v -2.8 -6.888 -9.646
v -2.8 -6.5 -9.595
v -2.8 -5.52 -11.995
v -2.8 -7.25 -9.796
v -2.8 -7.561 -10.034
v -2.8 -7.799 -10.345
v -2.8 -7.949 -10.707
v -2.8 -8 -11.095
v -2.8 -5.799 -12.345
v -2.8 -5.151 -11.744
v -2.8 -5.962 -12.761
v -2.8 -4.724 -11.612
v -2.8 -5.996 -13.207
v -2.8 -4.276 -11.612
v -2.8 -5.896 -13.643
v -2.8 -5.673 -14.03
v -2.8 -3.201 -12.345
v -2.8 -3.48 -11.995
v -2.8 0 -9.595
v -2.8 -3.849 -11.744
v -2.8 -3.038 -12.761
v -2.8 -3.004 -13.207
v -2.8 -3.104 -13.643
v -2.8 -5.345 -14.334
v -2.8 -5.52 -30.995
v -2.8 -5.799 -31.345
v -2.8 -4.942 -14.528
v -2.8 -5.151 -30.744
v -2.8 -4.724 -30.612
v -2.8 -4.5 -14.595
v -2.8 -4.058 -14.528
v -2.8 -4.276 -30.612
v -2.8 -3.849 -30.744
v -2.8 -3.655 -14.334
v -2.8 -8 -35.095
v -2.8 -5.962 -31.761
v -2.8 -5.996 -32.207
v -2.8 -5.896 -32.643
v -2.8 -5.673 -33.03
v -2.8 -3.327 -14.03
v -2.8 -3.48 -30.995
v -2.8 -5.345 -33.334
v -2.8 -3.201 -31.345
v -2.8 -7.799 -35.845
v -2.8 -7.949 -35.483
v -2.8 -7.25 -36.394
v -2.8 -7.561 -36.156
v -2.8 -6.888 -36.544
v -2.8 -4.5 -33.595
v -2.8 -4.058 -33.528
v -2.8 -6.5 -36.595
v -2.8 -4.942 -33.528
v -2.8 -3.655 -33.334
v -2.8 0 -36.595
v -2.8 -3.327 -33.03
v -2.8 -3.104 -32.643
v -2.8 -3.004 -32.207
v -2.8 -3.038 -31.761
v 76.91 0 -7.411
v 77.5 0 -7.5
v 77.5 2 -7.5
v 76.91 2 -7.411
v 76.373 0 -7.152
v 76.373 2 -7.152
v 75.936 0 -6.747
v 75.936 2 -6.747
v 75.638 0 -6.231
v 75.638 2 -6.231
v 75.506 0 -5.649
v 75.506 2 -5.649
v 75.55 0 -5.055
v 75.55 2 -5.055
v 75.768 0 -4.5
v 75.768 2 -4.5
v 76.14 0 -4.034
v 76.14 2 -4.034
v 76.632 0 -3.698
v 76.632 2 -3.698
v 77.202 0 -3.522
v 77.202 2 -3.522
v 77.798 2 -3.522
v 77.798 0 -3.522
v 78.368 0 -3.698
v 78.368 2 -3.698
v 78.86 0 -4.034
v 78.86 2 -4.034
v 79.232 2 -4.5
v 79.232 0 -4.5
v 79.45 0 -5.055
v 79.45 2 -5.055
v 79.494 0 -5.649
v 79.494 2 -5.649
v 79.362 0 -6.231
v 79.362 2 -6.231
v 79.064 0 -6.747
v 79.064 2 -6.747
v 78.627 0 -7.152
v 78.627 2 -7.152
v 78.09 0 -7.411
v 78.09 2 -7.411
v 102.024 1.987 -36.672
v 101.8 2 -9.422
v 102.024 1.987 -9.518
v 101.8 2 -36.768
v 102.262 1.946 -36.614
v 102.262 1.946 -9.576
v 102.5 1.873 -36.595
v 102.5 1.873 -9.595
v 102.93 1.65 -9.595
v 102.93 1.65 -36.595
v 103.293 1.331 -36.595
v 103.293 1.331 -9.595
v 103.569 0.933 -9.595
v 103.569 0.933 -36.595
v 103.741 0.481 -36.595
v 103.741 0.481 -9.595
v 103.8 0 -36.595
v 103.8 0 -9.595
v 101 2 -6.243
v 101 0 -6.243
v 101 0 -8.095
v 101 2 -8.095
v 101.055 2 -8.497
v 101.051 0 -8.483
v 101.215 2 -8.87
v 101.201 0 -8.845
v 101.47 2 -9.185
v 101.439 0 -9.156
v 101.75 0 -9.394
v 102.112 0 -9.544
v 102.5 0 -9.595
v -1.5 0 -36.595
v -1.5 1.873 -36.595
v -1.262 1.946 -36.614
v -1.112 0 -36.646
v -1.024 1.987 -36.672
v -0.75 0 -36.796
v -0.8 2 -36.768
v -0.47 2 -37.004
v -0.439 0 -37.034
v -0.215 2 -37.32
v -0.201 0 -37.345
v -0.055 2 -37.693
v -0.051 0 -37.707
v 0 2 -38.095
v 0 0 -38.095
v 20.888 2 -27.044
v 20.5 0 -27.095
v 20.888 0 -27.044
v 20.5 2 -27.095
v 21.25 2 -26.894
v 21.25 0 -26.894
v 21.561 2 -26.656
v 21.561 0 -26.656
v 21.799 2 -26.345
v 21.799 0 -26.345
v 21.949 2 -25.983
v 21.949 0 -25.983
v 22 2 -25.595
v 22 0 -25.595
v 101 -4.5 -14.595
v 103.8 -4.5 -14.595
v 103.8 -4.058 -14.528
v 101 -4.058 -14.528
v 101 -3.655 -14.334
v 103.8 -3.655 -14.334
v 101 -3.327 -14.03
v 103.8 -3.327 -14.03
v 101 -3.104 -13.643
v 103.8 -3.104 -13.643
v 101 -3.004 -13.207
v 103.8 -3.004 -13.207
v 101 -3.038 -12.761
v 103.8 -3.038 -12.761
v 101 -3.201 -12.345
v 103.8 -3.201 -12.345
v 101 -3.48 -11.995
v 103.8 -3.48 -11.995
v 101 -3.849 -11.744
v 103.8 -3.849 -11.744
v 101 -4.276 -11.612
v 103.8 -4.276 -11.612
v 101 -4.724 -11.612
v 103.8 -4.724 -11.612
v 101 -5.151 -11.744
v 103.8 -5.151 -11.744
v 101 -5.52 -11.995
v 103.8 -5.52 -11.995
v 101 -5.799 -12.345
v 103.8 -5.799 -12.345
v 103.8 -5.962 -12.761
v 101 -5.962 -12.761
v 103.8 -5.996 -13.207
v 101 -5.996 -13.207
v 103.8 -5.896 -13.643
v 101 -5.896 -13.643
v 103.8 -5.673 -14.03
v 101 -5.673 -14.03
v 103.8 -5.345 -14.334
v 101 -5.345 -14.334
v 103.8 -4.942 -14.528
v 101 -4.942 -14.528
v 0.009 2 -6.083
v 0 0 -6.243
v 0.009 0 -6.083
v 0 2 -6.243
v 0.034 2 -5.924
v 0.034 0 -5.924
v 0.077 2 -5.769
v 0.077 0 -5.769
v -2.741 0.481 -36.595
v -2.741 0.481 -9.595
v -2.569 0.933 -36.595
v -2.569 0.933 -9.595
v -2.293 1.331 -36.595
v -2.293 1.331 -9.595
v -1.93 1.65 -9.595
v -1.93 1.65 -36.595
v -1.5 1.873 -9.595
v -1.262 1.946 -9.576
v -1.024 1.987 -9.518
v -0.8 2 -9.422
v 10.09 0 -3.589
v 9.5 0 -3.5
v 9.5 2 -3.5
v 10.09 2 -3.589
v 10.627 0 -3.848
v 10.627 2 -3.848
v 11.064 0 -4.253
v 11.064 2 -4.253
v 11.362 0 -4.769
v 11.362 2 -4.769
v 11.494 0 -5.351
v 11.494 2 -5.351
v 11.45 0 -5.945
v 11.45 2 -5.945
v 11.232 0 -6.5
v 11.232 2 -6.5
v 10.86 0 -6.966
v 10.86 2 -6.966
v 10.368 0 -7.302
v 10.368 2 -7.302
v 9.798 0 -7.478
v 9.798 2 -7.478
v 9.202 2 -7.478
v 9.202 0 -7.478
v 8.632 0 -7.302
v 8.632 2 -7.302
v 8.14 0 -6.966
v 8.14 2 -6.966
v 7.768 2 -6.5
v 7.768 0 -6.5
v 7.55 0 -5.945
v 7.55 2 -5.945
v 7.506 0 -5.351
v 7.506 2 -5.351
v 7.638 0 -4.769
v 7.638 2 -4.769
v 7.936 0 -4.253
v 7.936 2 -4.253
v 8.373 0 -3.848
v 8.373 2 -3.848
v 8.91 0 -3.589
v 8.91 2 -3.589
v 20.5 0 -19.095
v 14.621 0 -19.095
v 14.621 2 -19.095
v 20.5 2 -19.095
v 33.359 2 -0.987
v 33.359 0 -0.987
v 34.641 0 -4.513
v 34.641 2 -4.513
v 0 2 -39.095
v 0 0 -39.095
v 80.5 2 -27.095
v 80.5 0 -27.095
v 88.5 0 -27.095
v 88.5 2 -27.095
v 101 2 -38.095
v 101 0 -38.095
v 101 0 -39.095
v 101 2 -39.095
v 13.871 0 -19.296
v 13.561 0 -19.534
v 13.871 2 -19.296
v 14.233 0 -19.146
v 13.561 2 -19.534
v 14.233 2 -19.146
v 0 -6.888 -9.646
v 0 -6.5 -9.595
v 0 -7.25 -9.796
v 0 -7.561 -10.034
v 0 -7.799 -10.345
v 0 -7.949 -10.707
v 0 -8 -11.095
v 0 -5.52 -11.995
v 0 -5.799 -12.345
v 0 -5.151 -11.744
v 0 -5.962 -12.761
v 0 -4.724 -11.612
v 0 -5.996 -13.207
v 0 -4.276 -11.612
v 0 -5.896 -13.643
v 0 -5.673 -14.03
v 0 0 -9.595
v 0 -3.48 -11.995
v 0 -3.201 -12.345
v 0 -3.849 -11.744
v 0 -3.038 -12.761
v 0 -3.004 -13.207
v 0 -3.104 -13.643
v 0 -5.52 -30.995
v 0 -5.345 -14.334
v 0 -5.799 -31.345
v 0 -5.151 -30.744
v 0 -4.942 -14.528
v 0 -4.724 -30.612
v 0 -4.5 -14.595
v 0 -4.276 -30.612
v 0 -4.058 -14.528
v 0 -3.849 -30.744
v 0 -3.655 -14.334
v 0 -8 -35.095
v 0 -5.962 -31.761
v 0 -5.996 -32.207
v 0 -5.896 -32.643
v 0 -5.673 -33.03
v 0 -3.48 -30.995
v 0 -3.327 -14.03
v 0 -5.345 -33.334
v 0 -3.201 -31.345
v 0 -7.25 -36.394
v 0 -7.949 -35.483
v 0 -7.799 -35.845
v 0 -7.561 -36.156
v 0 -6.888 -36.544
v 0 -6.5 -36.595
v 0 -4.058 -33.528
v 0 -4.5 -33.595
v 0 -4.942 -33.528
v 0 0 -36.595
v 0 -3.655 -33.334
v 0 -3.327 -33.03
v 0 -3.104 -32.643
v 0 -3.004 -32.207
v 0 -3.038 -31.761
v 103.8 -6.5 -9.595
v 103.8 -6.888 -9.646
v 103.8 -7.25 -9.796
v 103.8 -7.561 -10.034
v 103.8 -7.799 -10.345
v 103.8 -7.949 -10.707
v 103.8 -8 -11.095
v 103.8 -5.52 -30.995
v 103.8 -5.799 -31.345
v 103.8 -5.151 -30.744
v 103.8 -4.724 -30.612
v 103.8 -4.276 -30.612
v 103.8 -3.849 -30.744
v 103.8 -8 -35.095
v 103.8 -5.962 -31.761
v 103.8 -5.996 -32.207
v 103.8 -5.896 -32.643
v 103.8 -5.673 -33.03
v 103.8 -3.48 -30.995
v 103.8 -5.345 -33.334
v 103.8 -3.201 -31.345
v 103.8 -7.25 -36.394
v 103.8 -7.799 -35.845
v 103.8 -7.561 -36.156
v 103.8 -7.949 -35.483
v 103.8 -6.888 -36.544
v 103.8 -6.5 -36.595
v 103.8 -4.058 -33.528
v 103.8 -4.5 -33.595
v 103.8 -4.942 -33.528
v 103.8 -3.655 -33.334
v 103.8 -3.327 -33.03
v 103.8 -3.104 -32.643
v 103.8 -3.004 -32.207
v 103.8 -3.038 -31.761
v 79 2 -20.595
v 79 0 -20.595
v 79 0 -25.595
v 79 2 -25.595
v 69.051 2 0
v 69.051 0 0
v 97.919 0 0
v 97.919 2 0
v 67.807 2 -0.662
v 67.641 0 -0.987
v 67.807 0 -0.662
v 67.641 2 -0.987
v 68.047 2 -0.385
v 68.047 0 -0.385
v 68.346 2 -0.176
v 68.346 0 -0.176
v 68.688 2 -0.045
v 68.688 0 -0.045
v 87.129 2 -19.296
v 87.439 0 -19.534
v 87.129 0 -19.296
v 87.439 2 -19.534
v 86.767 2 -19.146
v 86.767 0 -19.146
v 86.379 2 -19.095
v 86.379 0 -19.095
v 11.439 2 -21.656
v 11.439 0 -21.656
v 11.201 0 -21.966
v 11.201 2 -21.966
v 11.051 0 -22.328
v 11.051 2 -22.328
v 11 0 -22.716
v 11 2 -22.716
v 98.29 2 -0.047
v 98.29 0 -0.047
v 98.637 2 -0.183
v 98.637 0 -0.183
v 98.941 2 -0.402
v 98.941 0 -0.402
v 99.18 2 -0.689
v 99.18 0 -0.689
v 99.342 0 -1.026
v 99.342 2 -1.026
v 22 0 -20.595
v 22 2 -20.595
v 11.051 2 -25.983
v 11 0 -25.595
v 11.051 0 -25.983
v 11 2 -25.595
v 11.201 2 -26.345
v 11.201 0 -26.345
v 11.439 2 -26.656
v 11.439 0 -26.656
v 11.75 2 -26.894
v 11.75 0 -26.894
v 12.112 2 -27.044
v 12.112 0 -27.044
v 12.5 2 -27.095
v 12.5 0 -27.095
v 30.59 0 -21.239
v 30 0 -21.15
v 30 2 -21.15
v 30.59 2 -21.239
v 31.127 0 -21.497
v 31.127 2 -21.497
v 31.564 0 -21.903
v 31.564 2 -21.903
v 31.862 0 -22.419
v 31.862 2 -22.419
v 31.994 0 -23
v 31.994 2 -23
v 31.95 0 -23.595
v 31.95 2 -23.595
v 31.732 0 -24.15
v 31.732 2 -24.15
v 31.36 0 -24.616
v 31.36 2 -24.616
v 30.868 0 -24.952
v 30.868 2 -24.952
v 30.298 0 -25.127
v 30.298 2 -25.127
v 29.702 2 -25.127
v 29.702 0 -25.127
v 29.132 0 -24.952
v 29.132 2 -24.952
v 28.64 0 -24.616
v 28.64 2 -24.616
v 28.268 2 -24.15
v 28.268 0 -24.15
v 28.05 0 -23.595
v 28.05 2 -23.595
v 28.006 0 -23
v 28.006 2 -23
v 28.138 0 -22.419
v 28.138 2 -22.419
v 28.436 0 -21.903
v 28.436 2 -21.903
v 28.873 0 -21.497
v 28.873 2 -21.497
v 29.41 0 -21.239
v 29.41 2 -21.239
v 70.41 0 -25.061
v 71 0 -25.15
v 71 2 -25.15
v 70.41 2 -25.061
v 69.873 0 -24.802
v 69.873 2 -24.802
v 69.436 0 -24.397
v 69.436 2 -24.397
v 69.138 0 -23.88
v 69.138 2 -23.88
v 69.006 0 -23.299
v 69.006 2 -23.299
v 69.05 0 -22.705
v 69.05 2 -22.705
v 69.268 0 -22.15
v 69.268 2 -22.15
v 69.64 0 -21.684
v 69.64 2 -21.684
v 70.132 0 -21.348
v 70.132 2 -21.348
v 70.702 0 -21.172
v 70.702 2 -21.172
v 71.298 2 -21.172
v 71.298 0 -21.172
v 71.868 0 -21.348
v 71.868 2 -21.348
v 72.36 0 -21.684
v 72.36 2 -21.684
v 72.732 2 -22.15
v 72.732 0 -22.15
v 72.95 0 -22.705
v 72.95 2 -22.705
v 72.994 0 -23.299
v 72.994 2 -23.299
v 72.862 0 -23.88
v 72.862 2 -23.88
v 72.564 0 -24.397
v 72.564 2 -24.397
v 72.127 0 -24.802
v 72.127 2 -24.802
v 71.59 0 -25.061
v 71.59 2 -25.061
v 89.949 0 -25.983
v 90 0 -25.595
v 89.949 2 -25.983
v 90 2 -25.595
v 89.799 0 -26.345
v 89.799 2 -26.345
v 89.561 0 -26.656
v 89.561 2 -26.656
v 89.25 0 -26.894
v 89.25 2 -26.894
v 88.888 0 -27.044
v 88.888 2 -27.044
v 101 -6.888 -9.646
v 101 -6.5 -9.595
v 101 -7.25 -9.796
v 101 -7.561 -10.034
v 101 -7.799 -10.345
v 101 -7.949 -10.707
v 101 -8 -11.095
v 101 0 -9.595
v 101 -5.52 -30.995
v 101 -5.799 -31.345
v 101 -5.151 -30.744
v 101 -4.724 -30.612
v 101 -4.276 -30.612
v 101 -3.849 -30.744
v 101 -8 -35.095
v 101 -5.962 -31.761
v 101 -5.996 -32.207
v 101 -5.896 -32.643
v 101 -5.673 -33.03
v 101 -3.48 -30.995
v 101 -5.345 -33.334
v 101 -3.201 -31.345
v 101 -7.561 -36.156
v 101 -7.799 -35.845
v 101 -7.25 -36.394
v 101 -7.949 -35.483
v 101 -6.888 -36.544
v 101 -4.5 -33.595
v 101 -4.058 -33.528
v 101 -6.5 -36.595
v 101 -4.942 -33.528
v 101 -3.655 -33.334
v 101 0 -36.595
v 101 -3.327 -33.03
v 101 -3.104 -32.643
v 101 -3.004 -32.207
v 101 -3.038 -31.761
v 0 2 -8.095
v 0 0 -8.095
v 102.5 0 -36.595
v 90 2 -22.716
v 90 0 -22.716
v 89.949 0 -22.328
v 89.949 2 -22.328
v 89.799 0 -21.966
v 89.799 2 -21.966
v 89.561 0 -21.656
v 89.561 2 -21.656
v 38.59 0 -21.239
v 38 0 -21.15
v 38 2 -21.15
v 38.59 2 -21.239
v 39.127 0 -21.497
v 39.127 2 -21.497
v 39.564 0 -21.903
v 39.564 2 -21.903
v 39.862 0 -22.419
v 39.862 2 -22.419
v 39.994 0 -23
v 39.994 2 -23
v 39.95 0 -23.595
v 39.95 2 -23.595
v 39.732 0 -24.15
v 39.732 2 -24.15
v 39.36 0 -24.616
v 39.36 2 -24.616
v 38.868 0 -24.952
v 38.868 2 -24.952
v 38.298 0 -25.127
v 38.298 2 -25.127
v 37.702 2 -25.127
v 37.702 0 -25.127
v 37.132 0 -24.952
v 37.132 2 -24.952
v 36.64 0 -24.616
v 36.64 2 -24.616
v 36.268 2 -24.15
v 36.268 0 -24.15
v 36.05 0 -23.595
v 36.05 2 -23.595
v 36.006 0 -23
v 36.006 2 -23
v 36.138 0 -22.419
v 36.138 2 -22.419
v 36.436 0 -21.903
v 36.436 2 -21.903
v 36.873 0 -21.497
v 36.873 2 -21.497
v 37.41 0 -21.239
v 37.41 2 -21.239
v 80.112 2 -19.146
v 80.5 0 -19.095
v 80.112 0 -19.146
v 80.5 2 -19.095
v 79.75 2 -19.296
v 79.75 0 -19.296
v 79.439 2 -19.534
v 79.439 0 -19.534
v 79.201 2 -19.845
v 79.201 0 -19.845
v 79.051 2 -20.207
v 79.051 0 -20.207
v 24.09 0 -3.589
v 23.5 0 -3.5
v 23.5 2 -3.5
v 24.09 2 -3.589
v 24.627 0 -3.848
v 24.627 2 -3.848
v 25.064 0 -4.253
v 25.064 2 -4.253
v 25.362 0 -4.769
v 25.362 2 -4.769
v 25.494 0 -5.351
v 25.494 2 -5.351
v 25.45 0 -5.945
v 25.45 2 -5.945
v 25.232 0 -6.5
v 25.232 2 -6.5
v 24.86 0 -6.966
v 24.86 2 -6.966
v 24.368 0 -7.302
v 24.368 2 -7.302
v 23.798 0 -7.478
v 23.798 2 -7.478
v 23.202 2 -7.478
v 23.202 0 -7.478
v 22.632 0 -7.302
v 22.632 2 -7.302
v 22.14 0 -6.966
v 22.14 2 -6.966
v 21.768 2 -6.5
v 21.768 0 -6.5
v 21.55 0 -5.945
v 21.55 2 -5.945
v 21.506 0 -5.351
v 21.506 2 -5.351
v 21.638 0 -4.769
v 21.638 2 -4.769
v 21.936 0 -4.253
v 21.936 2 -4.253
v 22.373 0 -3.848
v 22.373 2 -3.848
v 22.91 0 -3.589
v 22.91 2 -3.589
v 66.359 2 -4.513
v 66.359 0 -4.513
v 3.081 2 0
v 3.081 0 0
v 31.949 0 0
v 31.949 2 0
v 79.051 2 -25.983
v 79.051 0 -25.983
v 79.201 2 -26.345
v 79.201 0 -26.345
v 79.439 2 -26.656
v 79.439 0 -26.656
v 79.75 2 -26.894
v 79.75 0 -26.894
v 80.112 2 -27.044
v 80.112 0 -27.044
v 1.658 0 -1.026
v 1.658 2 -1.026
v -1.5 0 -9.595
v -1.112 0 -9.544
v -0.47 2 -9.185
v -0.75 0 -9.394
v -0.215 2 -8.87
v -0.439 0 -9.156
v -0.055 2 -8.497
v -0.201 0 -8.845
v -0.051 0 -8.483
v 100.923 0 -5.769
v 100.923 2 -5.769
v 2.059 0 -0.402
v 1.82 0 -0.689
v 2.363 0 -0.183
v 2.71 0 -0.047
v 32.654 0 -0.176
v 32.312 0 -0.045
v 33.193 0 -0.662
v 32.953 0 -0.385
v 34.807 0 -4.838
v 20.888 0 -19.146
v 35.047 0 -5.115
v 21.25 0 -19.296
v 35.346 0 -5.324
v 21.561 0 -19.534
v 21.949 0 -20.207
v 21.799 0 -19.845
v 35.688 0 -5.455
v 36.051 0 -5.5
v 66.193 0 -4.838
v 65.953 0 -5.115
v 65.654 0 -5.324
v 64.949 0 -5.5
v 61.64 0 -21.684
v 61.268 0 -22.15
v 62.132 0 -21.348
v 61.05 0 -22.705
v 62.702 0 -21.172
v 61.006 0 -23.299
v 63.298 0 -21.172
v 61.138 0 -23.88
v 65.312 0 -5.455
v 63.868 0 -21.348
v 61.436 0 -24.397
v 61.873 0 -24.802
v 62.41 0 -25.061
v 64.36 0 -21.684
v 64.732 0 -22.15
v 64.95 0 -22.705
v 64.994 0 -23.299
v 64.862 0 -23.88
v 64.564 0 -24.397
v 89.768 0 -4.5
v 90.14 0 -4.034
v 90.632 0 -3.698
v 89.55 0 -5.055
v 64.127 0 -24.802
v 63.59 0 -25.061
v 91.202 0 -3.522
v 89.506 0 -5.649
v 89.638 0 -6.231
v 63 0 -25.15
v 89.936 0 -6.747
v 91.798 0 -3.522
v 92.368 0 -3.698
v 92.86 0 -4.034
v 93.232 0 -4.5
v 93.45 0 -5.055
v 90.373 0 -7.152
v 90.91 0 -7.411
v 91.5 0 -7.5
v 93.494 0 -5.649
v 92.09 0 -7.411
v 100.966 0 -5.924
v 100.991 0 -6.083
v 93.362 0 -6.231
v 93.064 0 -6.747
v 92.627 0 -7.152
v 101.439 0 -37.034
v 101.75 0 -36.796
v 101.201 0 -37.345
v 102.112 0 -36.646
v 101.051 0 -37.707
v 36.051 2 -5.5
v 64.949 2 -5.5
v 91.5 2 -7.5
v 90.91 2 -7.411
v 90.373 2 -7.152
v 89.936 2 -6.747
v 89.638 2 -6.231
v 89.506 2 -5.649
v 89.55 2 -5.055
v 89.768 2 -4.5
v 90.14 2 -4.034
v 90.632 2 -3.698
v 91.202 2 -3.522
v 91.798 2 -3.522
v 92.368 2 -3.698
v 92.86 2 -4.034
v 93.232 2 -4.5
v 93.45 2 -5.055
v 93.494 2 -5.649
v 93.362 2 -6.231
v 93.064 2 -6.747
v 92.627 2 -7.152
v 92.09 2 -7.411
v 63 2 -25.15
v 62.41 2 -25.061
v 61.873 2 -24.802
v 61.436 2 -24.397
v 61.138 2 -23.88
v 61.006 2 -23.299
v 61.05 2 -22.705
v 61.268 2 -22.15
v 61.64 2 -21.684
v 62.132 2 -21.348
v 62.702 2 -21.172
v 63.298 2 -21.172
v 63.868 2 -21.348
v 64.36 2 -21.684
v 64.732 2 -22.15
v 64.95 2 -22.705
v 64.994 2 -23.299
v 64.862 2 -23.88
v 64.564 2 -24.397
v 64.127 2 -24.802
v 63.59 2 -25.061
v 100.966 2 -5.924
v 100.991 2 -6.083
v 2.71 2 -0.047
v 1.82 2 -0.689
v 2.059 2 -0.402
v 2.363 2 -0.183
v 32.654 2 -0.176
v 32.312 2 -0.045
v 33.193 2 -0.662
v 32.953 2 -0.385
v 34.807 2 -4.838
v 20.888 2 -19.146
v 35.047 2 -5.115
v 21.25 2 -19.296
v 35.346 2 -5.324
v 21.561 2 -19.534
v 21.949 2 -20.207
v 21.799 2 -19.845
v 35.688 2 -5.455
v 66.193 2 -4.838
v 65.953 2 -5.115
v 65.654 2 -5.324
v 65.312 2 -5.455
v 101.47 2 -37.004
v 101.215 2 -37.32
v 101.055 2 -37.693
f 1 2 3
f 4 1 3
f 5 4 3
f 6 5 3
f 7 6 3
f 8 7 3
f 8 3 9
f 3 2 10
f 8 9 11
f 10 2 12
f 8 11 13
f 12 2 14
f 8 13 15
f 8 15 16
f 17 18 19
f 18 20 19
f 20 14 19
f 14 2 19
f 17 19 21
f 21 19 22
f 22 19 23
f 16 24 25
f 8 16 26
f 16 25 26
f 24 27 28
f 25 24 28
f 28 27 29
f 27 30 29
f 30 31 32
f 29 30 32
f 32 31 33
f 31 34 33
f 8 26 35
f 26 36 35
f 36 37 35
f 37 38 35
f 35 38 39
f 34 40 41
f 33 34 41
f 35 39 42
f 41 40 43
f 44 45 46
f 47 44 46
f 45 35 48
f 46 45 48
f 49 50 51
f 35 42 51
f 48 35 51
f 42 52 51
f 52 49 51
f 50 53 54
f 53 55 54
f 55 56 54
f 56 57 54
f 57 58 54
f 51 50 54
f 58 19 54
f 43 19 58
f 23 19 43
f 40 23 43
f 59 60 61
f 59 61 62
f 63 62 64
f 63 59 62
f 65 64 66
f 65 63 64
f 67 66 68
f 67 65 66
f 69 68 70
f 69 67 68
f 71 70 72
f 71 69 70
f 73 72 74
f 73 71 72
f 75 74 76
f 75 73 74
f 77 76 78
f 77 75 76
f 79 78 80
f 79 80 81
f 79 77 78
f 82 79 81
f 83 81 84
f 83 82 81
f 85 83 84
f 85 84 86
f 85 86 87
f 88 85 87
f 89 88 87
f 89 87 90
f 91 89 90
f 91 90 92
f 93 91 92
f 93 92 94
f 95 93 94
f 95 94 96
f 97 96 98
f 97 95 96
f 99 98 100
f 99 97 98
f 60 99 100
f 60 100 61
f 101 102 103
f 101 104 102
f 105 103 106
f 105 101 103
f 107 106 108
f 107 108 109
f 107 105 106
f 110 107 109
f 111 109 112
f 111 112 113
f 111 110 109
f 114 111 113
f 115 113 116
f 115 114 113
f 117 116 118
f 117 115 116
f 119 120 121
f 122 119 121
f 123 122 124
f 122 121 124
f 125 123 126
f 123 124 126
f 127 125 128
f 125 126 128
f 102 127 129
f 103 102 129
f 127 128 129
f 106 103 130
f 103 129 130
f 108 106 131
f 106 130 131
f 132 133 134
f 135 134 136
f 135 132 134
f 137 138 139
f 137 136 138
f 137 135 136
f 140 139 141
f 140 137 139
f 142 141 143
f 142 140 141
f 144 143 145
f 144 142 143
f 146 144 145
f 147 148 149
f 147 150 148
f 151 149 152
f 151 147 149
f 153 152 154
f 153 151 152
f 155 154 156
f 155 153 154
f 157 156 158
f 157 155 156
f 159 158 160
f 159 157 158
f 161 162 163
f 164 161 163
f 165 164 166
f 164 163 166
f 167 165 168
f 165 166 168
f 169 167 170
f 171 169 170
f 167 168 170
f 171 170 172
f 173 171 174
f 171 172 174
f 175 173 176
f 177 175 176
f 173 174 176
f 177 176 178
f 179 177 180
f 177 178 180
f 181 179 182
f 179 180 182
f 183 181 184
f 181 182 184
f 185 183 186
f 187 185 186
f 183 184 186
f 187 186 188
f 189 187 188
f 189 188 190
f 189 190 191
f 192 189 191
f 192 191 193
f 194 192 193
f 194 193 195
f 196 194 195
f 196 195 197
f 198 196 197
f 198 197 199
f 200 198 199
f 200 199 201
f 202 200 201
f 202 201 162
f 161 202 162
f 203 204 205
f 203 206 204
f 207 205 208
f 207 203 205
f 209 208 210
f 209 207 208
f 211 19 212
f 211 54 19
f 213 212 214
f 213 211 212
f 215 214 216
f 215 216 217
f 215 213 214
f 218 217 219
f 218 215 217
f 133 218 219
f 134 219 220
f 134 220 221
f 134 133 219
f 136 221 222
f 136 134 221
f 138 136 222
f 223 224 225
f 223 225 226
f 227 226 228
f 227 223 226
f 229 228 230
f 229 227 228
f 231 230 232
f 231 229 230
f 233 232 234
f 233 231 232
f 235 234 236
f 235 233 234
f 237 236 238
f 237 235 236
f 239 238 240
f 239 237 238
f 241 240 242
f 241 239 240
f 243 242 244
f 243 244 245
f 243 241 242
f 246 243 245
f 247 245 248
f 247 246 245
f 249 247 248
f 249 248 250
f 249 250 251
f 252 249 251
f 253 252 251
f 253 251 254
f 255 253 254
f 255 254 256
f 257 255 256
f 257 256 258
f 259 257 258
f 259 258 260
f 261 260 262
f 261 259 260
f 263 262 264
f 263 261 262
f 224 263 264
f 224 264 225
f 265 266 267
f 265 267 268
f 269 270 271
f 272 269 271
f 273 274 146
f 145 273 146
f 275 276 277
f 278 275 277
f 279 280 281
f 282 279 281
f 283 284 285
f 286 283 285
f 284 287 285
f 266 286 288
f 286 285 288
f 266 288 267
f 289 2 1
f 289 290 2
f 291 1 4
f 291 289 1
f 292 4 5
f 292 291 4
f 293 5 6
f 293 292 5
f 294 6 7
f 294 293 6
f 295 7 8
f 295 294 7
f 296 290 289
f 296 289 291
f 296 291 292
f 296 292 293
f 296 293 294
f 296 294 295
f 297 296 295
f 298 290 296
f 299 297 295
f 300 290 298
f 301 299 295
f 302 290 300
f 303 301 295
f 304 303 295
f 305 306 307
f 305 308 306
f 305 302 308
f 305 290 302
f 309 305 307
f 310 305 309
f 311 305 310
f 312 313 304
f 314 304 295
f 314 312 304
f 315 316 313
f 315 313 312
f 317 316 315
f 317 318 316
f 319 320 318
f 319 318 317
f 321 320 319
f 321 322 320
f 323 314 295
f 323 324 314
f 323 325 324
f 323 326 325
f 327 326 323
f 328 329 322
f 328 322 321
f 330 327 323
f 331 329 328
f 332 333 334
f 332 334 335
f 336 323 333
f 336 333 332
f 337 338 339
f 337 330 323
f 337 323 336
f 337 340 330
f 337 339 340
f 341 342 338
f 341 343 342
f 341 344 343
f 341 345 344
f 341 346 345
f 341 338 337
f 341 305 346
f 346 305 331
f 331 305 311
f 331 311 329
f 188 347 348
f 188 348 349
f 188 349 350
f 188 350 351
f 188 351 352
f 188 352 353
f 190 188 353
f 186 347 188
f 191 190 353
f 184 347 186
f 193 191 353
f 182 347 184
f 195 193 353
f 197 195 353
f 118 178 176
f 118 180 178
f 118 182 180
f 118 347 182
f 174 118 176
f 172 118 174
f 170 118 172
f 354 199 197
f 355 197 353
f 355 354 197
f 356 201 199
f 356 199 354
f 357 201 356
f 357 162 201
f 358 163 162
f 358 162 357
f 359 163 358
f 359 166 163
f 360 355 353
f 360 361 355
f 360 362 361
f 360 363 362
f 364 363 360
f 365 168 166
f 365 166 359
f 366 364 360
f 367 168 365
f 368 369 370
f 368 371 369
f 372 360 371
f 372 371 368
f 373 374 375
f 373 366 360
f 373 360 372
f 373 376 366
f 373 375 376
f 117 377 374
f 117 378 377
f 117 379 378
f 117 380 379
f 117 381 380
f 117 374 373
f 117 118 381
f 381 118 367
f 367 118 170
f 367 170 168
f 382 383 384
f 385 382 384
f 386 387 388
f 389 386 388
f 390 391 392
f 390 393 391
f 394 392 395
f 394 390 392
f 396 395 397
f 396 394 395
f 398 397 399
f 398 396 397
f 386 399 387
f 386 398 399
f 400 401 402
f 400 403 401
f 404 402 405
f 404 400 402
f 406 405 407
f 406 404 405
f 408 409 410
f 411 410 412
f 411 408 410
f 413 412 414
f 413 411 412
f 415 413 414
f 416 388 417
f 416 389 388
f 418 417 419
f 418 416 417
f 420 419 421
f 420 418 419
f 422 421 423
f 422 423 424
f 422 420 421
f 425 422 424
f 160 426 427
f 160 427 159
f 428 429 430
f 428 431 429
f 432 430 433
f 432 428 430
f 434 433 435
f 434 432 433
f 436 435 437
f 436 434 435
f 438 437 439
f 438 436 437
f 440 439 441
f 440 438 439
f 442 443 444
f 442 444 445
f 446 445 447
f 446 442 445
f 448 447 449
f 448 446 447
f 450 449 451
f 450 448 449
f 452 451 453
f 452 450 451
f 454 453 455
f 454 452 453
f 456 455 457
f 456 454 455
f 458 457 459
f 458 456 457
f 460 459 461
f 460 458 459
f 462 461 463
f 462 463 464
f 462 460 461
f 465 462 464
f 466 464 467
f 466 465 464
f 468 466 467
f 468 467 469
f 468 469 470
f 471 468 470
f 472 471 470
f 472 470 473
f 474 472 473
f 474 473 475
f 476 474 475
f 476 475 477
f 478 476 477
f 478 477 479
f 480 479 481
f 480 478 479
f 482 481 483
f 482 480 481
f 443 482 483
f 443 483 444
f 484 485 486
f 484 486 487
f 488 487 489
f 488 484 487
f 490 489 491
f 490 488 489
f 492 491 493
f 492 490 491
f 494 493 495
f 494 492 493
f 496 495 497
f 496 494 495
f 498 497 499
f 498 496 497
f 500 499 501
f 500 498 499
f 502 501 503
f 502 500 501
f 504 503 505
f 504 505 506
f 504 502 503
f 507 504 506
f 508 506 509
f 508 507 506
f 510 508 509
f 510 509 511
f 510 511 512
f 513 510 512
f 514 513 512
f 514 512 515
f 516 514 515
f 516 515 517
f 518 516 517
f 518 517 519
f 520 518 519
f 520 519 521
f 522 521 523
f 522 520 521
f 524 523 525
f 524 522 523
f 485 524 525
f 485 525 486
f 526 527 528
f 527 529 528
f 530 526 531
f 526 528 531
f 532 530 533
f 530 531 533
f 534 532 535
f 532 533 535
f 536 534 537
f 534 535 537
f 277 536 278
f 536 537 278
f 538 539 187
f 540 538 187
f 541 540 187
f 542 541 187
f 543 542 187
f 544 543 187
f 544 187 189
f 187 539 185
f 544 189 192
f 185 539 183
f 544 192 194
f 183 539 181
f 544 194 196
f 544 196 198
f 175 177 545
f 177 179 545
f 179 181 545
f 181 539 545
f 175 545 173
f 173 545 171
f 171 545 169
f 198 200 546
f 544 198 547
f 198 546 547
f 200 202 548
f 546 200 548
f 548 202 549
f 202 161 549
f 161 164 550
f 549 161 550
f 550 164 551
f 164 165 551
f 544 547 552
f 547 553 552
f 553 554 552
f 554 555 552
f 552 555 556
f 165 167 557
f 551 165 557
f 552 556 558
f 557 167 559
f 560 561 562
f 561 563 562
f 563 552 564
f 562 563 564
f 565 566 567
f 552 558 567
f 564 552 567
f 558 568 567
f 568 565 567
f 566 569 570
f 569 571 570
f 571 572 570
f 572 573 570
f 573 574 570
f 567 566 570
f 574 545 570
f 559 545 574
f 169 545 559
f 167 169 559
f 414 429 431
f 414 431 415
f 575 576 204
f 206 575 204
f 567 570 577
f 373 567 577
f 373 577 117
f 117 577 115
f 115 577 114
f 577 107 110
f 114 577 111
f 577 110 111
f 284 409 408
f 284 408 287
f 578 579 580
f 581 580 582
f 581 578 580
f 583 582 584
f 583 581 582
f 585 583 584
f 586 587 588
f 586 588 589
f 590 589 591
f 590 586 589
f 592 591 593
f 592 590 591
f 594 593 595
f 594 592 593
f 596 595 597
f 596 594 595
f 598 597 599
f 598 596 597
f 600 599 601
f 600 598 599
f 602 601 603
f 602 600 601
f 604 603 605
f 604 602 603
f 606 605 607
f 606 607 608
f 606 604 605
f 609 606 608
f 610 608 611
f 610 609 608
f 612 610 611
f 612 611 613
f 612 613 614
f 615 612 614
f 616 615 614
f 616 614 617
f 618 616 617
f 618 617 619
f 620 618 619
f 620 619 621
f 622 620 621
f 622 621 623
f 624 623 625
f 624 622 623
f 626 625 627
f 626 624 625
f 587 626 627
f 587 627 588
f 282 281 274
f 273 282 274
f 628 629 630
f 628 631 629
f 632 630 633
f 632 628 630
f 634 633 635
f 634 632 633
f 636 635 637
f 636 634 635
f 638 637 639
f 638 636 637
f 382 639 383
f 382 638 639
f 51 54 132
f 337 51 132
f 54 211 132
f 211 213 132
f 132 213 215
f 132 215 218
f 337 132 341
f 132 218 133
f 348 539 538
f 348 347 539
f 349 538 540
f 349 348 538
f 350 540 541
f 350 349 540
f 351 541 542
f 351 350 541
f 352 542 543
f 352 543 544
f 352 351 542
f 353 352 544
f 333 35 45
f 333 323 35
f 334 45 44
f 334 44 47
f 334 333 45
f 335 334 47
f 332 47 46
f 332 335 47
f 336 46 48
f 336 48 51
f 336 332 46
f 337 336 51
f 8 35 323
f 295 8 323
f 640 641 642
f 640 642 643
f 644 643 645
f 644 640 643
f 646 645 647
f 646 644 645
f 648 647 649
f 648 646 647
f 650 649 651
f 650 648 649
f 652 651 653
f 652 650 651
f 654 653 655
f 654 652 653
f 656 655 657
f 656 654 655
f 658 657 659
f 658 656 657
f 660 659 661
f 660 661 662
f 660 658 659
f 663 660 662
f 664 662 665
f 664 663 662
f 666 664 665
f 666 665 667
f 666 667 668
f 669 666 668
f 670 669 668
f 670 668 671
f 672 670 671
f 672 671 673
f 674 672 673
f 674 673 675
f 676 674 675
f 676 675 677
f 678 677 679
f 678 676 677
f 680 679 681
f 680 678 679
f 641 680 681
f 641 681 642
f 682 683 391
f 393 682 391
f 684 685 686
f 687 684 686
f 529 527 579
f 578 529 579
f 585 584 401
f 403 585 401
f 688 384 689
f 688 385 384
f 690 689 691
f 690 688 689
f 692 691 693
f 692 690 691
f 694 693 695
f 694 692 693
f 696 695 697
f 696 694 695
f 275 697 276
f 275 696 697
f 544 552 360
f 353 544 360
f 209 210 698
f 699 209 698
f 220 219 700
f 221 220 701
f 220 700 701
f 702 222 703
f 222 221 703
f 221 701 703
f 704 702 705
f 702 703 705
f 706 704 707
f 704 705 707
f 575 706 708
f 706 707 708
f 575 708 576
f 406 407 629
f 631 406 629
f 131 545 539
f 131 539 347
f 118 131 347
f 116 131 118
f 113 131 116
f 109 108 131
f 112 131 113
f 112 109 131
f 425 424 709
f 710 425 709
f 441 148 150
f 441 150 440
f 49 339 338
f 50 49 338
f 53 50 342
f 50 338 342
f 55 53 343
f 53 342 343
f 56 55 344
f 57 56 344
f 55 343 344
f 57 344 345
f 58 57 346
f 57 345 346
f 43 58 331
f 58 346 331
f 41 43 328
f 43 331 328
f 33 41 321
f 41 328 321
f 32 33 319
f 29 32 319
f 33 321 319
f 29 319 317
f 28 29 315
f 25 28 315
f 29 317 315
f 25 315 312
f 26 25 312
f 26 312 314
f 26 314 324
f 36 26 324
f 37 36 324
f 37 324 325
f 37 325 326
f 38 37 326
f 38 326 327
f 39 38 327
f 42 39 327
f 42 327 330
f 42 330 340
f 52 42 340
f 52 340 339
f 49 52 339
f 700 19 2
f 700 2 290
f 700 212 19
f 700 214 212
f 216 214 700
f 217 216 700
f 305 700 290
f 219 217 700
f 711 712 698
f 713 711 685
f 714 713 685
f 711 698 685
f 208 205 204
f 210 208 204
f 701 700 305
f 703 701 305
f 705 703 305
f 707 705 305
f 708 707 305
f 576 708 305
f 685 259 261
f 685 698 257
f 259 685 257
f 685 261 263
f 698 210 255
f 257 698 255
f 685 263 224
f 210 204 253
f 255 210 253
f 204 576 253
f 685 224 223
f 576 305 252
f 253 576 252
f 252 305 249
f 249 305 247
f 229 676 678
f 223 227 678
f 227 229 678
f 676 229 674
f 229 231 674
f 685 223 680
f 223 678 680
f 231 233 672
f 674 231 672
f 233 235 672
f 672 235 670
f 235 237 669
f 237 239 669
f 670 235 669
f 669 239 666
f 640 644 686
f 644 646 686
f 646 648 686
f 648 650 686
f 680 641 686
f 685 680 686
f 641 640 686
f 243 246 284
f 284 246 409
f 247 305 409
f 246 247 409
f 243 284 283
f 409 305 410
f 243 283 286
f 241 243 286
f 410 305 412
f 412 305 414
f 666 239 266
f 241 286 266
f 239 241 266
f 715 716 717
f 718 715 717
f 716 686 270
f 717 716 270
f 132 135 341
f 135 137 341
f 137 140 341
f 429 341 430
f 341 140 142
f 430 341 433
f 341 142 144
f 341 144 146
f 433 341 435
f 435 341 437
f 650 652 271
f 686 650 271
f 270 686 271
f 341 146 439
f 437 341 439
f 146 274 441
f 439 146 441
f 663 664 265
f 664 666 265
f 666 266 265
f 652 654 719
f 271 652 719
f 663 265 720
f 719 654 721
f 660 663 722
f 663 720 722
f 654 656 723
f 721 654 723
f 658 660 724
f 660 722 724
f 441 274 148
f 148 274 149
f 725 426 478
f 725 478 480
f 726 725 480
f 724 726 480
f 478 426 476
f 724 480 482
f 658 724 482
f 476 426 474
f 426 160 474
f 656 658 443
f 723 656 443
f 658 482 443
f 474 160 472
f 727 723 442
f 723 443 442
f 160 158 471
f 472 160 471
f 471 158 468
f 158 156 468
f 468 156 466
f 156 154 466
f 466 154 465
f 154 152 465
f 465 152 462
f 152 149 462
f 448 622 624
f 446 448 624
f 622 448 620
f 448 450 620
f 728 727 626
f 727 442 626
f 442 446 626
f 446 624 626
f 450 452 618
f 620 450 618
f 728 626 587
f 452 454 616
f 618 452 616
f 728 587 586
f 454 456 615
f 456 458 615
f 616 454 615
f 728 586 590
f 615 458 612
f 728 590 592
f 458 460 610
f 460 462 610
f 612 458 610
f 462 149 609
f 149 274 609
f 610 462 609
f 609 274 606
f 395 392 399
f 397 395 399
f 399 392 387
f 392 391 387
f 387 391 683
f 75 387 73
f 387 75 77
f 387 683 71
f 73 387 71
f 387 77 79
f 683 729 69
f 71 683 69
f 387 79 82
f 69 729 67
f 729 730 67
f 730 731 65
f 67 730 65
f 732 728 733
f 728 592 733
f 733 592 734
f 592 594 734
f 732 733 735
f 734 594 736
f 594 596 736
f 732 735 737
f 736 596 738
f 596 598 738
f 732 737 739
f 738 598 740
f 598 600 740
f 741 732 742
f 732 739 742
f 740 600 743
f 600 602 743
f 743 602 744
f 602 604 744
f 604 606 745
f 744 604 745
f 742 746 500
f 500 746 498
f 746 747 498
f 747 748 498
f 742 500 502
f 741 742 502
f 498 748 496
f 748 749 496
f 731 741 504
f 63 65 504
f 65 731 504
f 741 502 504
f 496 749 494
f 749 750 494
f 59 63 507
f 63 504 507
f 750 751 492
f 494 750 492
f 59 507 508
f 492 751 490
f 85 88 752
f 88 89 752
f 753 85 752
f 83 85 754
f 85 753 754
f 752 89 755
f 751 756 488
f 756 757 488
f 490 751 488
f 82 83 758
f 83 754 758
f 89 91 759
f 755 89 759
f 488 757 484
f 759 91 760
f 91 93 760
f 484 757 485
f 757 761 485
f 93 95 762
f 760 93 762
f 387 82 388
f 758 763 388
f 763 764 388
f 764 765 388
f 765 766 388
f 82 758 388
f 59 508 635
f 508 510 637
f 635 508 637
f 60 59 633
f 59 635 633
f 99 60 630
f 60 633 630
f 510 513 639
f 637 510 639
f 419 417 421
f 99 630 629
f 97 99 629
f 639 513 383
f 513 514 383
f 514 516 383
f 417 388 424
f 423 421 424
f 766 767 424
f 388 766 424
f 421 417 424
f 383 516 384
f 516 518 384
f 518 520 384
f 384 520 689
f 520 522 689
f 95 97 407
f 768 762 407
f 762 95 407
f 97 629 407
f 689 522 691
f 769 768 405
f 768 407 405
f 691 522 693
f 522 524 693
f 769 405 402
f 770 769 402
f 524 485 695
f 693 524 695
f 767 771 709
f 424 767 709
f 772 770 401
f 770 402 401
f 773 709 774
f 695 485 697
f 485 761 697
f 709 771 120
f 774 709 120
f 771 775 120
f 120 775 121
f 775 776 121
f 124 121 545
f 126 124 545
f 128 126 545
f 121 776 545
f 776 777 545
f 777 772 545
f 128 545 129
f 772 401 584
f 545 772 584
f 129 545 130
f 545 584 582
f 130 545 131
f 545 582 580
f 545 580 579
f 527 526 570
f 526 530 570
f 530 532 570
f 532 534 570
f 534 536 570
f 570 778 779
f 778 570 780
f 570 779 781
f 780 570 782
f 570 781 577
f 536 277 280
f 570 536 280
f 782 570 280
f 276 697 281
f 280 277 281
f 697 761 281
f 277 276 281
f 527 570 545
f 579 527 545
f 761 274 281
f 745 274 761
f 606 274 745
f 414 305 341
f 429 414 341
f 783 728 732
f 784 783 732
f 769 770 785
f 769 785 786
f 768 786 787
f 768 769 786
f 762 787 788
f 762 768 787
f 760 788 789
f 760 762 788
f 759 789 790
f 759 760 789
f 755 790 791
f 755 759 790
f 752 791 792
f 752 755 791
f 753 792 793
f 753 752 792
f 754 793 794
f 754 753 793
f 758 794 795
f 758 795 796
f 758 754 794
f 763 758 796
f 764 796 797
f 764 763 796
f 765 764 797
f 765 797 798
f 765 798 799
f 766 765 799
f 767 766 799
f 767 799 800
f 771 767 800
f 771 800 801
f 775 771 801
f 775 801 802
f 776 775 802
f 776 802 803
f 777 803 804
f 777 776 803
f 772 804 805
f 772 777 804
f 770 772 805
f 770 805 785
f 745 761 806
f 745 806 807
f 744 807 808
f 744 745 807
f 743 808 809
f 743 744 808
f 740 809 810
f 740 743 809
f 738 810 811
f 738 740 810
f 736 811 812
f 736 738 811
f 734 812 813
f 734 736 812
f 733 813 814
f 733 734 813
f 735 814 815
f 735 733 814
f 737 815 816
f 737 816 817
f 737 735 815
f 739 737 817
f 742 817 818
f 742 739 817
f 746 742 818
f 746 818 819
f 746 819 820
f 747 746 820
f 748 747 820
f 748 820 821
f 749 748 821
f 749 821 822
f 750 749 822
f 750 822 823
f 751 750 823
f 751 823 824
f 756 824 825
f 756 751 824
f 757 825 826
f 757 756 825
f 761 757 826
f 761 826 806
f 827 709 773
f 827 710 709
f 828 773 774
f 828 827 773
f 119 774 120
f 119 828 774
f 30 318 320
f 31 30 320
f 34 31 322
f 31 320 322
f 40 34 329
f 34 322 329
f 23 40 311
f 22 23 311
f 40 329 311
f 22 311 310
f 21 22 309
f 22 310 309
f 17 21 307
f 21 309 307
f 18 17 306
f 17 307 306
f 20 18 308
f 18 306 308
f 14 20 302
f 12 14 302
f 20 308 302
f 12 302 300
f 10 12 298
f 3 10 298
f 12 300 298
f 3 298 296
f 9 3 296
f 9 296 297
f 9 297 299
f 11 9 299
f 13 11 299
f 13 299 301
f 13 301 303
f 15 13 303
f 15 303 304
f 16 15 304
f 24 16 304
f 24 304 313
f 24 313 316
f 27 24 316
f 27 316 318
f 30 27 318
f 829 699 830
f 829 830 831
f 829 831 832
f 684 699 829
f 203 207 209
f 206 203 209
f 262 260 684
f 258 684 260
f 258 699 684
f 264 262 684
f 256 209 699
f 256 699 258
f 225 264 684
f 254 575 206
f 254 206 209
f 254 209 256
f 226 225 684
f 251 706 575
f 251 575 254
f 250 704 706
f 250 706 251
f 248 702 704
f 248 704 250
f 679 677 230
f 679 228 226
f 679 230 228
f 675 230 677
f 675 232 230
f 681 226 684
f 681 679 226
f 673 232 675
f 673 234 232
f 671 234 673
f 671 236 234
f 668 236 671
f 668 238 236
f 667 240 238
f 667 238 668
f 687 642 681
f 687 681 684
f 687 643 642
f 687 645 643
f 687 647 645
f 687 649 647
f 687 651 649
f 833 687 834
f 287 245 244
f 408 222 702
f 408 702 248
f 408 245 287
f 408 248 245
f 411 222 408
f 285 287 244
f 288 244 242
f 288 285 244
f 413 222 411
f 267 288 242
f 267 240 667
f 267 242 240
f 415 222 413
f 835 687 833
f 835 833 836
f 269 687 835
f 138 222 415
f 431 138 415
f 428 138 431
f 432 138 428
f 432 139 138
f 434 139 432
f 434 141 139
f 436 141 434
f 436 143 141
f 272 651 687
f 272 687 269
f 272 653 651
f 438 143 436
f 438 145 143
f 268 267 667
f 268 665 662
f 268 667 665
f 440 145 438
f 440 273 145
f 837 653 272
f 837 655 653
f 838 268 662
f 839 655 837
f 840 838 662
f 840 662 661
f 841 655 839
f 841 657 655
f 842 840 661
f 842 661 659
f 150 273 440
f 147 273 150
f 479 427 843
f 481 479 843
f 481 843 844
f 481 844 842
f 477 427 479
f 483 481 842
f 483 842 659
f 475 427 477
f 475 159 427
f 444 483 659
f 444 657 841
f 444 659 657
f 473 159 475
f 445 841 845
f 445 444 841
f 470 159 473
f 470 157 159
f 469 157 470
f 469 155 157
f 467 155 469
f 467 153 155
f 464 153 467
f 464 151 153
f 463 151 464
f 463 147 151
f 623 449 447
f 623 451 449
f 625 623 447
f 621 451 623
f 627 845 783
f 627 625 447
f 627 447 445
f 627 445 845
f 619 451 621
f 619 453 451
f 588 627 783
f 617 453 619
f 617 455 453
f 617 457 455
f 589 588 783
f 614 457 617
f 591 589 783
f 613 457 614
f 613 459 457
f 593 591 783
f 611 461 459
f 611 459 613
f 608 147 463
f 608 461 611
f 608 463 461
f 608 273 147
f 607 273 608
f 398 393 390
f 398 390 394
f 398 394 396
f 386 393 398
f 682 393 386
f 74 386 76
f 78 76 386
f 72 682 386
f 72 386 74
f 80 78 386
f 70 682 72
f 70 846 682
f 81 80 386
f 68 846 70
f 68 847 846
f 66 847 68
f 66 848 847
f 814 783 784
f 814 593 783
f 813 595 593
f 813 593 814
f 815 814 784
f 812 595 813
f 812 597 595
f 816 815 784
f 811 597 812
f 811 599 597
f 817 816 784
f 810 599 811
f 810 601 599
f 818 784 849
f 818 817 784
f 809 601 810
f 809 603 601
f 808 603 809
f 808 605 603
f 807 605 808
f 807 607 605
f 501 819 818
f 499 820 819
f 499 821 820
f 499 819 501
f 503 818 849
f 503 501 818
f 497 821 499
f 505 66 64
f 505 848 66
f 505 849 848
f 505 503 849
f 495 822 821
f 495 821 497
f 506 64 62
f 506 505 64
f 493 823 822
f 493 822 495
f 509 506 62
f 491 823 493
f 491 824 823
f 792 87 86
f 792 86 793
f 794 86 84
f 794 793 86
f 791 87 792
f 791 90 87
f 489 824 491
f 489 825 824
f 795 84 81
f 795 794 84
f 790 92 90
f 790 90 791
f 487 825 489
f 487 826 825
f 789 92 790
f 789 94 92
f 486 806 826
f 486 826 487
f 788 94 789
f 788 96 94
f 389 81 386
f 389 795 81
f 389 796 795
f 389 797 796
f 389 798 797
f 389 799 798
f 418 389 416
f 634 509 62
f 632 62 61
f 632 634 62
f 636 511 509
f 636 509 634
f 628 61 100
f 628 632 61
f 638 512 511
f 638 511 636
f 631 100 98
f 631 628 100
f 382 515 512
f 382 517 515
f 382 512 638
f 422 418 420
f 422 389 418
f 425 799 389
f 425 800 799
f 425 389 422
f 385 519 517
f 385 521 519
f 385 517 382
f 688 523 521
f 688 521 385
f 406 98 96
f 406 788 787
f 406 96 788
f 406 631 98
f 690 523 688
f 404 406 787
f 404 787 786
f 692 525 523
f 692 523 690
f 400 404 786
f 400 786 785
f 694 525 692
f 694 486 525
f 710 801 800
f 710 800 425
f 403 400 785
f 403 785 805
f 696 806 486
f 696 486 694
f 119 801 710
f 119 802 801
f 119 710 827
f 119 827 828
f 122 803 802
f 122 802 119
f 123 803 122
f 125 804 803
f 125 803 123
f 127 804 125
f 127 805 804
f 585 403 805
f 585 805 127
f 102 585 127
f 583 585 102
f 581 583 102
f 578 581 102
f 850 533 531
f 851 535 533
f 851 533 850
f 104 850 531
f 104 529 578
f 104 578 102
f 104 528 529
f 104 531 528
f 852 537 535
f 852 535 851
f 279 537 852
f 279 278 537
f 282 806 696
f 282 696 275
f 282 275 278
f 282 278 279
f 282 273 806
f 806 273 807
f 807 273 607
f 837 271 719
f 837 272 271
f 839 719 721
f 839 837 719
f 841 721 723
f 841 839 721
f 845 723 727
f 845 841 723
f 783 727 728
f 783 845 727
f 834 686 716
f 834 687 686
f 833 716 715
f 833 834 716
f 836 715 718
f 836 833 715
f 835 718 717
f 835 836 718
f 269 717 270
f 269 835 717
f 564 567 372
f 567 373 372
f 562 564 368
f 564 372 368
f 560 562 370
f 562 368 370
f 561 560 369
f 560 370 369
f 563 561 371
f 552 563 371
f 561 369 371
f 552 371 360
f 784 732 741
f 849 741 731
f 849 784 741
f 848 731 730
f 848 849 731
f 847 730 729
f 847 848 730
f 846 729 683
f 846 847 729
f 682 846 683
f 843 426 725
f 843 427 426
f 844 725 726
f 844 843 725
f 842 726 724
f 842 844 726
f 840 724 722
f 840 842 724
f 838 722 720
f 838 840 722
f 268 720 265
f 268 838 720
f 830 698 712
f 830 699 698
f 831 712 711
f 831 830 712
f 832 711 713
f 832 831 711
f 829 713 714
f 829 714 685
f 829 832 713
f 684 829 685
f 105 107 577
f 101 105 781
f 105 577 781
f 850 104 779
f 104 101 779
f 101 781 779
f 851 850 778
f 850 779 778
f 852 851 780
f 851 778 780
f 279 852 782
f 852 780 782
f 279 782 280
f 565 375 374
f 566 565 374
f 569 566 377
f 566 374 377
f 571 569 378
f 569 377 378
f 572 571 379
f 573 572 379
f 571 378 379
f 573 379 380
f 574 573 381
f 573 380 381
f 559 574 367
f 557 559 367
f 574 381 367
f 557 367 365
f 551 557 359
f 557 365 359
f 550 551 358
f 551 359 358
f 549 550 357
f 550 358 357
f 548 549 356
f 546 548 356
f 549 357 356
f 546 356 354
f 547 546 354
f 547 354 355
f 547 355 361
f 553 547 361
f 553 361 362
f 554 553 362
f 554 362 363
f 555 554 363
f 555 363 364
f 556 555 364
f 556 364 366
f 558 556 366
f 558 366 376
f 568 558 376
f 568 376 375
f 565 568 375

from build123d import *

# Parameters (mm, degrees)
SKETCH1_R           = 2
BOSS_EXTRUDE1_DEPTH = 2
SKETCH2_W           = 2.8
SKETCH2_H           = 27
BOSS_EXTRUDE2_DEPTH = 10
SKETCH3_R           = 1.5
CUT_EXTRUDE1_DEPTH  = 114.824325613
FILLET1_R           = 1.5
FILLET2_R           = 2


with BuildPart() as part:
    # Sketch1 → Boss-Extrude1 (new body)
    with BuildSketch(Plane(origin=(0, 0, 0), x_dir=(1, 0, 0), z_dir=(0, 1, 0))):
        Polygon((0, 6), (2, 0), (33, 0), (35, 5.5), (66, 5.5), (68, 0), (99, 0), (101, 6), (101, 39.094975397), (0, 39.094975397), align=None)
        with Locations(Location((9.5, 5.5, 0), (0, 0, 270))):
            Circle(SKETCH1_R, mode=Mode.SUBTRACT)
        with Locations(Location((23.5, 5.5, 0), (0, 0, 270))):
            Circle(SKETCH1_R, mode=Mode.SUBTRACT)
        with Locations(Location((77.5, 5.5, 0), (0, 0, 90))):
            Circle(SKETCH1_R, mode=Mode.SUBTRACT)
        with Locations(Location((91.5, 5.5, 0), (0, 0, 90))):
            Circle(SKETCH1_R, mode=Mode.SUBTRACT)
        with Locations(Location((30, 23.149785568, 0), (0, 0, 270))):
            Circle(SKETCH1_R, mode=Mode.SUBTRACT)
        with Locations(Location((38, 23.149785568, 0), (0, 0, 270))):
            Circle(SKETCH1_R, mode=Mode.SUBTRACT)
        with Locations(Location((63, 23.149785568, 0), (0, 0, 90))):
            Circle(SKETCH1_R, mode=Mode.SUBTRACT)
        with Locations(Location((71, 23.149785568, 0), (0, 0, 90))):
            Circle(SKETCH1_R, mode=Mode.SUBTRACT)
        Polygon((11, 22.094975397), (14, 19.094975397), (22, 19.094975397), (22, 27.094975397), (11, 27.094975397), align=None, mode=Mode.SUBTRACT)
        Polygon((90, 27.094975397), (90, 22.094975397), (87, 19.094975397), (79, 19.094975397), (79, 27.094975397), align=None, mode=Mode.SUBTRACT)
    extrude(amount=BOSS_EXTRUDE1_DEPTH)

    # Sketch2 → Boss-Extrude2 (add)
    with BuildSketch(Plane(origin=(0, 2, 0), x_dir=(1, 0, 0), z_dir=(0, 1, 0))):
        with Locations((-1.4, 23.094975397)):
            Rectangle(SKETCH2_W, SKETCH2_H)
        with Locations((102.4, 23.094975397)):
            Rectangle(SKETCH2_W, SKETCH2_H)
    extrude(amount=-BOSS_EXTRUDE2_DEPTH)

    # Sketch3 → Cut-Extrude1 (cut, through all)
    with BuildSketch(Plane(origin=(103.8, 0, 0), x_dir=(0, 0, -1), z_dir=(1, 0, 0))):
        with Locations((13.094975397, -4.5)):
            Circle(SKETCH3_R)
        with Locations((32.094975397, -4.5)):
            Circle(SKETCH3_R)
    extrude(amount=-CUT_EXTRUDE1_DEPTH, mode=Mode.SUBTRACT)

    # Fillet1
    fillet1_edges = [part.edges().sort_by_distance(p)[0] for p in [
        (-1.4, -8, -9.594975397),
        (-1.4, -8, -36.594975397),
        (0, 1, -9.594975397),
        (0, 1, -6),
        (2, 1, 0),
        (0, 1, -36.594975397),
        (102.4, -8, -36.594975397),
        (101, 1, -36.594975397),
        (102.4, -8, -9.594975397),
        (101, 1, -9.594975397),
        (101, 1, -6),
        (99, 1, 0),
        (66, 1, -5.5),
        (68, 1, 0),
        (90, 1, -27.094975397),
        (79, 1, -27.094975397),
        (90, 1, -22.094975397),
        (87, 1, -19.094975397),
        (79, 1, -19.094975397),
        (35, 1, -5.5),
        (33, 1, 0),
        (11, 1, -27.094975397),
        (11, 1, -22.094975397),
        (14, 1, -19.094975397),
        (22, 1, -19.094975397),
        (22, 1, -27.094975397),
    ]]
    fillet(fillet1_edges, radius=FILLET1_R)

    # Fillet2
    fillet2_edges = [part.edges().sort_by_distance(p)[0] for p in [
        (-2.8, 2, -23.094975397),
        (103.8, 2, -23.094975397),
    ]]
    fillet(fillet2_edges, radius=FILLET2_R)


solid = part.part
